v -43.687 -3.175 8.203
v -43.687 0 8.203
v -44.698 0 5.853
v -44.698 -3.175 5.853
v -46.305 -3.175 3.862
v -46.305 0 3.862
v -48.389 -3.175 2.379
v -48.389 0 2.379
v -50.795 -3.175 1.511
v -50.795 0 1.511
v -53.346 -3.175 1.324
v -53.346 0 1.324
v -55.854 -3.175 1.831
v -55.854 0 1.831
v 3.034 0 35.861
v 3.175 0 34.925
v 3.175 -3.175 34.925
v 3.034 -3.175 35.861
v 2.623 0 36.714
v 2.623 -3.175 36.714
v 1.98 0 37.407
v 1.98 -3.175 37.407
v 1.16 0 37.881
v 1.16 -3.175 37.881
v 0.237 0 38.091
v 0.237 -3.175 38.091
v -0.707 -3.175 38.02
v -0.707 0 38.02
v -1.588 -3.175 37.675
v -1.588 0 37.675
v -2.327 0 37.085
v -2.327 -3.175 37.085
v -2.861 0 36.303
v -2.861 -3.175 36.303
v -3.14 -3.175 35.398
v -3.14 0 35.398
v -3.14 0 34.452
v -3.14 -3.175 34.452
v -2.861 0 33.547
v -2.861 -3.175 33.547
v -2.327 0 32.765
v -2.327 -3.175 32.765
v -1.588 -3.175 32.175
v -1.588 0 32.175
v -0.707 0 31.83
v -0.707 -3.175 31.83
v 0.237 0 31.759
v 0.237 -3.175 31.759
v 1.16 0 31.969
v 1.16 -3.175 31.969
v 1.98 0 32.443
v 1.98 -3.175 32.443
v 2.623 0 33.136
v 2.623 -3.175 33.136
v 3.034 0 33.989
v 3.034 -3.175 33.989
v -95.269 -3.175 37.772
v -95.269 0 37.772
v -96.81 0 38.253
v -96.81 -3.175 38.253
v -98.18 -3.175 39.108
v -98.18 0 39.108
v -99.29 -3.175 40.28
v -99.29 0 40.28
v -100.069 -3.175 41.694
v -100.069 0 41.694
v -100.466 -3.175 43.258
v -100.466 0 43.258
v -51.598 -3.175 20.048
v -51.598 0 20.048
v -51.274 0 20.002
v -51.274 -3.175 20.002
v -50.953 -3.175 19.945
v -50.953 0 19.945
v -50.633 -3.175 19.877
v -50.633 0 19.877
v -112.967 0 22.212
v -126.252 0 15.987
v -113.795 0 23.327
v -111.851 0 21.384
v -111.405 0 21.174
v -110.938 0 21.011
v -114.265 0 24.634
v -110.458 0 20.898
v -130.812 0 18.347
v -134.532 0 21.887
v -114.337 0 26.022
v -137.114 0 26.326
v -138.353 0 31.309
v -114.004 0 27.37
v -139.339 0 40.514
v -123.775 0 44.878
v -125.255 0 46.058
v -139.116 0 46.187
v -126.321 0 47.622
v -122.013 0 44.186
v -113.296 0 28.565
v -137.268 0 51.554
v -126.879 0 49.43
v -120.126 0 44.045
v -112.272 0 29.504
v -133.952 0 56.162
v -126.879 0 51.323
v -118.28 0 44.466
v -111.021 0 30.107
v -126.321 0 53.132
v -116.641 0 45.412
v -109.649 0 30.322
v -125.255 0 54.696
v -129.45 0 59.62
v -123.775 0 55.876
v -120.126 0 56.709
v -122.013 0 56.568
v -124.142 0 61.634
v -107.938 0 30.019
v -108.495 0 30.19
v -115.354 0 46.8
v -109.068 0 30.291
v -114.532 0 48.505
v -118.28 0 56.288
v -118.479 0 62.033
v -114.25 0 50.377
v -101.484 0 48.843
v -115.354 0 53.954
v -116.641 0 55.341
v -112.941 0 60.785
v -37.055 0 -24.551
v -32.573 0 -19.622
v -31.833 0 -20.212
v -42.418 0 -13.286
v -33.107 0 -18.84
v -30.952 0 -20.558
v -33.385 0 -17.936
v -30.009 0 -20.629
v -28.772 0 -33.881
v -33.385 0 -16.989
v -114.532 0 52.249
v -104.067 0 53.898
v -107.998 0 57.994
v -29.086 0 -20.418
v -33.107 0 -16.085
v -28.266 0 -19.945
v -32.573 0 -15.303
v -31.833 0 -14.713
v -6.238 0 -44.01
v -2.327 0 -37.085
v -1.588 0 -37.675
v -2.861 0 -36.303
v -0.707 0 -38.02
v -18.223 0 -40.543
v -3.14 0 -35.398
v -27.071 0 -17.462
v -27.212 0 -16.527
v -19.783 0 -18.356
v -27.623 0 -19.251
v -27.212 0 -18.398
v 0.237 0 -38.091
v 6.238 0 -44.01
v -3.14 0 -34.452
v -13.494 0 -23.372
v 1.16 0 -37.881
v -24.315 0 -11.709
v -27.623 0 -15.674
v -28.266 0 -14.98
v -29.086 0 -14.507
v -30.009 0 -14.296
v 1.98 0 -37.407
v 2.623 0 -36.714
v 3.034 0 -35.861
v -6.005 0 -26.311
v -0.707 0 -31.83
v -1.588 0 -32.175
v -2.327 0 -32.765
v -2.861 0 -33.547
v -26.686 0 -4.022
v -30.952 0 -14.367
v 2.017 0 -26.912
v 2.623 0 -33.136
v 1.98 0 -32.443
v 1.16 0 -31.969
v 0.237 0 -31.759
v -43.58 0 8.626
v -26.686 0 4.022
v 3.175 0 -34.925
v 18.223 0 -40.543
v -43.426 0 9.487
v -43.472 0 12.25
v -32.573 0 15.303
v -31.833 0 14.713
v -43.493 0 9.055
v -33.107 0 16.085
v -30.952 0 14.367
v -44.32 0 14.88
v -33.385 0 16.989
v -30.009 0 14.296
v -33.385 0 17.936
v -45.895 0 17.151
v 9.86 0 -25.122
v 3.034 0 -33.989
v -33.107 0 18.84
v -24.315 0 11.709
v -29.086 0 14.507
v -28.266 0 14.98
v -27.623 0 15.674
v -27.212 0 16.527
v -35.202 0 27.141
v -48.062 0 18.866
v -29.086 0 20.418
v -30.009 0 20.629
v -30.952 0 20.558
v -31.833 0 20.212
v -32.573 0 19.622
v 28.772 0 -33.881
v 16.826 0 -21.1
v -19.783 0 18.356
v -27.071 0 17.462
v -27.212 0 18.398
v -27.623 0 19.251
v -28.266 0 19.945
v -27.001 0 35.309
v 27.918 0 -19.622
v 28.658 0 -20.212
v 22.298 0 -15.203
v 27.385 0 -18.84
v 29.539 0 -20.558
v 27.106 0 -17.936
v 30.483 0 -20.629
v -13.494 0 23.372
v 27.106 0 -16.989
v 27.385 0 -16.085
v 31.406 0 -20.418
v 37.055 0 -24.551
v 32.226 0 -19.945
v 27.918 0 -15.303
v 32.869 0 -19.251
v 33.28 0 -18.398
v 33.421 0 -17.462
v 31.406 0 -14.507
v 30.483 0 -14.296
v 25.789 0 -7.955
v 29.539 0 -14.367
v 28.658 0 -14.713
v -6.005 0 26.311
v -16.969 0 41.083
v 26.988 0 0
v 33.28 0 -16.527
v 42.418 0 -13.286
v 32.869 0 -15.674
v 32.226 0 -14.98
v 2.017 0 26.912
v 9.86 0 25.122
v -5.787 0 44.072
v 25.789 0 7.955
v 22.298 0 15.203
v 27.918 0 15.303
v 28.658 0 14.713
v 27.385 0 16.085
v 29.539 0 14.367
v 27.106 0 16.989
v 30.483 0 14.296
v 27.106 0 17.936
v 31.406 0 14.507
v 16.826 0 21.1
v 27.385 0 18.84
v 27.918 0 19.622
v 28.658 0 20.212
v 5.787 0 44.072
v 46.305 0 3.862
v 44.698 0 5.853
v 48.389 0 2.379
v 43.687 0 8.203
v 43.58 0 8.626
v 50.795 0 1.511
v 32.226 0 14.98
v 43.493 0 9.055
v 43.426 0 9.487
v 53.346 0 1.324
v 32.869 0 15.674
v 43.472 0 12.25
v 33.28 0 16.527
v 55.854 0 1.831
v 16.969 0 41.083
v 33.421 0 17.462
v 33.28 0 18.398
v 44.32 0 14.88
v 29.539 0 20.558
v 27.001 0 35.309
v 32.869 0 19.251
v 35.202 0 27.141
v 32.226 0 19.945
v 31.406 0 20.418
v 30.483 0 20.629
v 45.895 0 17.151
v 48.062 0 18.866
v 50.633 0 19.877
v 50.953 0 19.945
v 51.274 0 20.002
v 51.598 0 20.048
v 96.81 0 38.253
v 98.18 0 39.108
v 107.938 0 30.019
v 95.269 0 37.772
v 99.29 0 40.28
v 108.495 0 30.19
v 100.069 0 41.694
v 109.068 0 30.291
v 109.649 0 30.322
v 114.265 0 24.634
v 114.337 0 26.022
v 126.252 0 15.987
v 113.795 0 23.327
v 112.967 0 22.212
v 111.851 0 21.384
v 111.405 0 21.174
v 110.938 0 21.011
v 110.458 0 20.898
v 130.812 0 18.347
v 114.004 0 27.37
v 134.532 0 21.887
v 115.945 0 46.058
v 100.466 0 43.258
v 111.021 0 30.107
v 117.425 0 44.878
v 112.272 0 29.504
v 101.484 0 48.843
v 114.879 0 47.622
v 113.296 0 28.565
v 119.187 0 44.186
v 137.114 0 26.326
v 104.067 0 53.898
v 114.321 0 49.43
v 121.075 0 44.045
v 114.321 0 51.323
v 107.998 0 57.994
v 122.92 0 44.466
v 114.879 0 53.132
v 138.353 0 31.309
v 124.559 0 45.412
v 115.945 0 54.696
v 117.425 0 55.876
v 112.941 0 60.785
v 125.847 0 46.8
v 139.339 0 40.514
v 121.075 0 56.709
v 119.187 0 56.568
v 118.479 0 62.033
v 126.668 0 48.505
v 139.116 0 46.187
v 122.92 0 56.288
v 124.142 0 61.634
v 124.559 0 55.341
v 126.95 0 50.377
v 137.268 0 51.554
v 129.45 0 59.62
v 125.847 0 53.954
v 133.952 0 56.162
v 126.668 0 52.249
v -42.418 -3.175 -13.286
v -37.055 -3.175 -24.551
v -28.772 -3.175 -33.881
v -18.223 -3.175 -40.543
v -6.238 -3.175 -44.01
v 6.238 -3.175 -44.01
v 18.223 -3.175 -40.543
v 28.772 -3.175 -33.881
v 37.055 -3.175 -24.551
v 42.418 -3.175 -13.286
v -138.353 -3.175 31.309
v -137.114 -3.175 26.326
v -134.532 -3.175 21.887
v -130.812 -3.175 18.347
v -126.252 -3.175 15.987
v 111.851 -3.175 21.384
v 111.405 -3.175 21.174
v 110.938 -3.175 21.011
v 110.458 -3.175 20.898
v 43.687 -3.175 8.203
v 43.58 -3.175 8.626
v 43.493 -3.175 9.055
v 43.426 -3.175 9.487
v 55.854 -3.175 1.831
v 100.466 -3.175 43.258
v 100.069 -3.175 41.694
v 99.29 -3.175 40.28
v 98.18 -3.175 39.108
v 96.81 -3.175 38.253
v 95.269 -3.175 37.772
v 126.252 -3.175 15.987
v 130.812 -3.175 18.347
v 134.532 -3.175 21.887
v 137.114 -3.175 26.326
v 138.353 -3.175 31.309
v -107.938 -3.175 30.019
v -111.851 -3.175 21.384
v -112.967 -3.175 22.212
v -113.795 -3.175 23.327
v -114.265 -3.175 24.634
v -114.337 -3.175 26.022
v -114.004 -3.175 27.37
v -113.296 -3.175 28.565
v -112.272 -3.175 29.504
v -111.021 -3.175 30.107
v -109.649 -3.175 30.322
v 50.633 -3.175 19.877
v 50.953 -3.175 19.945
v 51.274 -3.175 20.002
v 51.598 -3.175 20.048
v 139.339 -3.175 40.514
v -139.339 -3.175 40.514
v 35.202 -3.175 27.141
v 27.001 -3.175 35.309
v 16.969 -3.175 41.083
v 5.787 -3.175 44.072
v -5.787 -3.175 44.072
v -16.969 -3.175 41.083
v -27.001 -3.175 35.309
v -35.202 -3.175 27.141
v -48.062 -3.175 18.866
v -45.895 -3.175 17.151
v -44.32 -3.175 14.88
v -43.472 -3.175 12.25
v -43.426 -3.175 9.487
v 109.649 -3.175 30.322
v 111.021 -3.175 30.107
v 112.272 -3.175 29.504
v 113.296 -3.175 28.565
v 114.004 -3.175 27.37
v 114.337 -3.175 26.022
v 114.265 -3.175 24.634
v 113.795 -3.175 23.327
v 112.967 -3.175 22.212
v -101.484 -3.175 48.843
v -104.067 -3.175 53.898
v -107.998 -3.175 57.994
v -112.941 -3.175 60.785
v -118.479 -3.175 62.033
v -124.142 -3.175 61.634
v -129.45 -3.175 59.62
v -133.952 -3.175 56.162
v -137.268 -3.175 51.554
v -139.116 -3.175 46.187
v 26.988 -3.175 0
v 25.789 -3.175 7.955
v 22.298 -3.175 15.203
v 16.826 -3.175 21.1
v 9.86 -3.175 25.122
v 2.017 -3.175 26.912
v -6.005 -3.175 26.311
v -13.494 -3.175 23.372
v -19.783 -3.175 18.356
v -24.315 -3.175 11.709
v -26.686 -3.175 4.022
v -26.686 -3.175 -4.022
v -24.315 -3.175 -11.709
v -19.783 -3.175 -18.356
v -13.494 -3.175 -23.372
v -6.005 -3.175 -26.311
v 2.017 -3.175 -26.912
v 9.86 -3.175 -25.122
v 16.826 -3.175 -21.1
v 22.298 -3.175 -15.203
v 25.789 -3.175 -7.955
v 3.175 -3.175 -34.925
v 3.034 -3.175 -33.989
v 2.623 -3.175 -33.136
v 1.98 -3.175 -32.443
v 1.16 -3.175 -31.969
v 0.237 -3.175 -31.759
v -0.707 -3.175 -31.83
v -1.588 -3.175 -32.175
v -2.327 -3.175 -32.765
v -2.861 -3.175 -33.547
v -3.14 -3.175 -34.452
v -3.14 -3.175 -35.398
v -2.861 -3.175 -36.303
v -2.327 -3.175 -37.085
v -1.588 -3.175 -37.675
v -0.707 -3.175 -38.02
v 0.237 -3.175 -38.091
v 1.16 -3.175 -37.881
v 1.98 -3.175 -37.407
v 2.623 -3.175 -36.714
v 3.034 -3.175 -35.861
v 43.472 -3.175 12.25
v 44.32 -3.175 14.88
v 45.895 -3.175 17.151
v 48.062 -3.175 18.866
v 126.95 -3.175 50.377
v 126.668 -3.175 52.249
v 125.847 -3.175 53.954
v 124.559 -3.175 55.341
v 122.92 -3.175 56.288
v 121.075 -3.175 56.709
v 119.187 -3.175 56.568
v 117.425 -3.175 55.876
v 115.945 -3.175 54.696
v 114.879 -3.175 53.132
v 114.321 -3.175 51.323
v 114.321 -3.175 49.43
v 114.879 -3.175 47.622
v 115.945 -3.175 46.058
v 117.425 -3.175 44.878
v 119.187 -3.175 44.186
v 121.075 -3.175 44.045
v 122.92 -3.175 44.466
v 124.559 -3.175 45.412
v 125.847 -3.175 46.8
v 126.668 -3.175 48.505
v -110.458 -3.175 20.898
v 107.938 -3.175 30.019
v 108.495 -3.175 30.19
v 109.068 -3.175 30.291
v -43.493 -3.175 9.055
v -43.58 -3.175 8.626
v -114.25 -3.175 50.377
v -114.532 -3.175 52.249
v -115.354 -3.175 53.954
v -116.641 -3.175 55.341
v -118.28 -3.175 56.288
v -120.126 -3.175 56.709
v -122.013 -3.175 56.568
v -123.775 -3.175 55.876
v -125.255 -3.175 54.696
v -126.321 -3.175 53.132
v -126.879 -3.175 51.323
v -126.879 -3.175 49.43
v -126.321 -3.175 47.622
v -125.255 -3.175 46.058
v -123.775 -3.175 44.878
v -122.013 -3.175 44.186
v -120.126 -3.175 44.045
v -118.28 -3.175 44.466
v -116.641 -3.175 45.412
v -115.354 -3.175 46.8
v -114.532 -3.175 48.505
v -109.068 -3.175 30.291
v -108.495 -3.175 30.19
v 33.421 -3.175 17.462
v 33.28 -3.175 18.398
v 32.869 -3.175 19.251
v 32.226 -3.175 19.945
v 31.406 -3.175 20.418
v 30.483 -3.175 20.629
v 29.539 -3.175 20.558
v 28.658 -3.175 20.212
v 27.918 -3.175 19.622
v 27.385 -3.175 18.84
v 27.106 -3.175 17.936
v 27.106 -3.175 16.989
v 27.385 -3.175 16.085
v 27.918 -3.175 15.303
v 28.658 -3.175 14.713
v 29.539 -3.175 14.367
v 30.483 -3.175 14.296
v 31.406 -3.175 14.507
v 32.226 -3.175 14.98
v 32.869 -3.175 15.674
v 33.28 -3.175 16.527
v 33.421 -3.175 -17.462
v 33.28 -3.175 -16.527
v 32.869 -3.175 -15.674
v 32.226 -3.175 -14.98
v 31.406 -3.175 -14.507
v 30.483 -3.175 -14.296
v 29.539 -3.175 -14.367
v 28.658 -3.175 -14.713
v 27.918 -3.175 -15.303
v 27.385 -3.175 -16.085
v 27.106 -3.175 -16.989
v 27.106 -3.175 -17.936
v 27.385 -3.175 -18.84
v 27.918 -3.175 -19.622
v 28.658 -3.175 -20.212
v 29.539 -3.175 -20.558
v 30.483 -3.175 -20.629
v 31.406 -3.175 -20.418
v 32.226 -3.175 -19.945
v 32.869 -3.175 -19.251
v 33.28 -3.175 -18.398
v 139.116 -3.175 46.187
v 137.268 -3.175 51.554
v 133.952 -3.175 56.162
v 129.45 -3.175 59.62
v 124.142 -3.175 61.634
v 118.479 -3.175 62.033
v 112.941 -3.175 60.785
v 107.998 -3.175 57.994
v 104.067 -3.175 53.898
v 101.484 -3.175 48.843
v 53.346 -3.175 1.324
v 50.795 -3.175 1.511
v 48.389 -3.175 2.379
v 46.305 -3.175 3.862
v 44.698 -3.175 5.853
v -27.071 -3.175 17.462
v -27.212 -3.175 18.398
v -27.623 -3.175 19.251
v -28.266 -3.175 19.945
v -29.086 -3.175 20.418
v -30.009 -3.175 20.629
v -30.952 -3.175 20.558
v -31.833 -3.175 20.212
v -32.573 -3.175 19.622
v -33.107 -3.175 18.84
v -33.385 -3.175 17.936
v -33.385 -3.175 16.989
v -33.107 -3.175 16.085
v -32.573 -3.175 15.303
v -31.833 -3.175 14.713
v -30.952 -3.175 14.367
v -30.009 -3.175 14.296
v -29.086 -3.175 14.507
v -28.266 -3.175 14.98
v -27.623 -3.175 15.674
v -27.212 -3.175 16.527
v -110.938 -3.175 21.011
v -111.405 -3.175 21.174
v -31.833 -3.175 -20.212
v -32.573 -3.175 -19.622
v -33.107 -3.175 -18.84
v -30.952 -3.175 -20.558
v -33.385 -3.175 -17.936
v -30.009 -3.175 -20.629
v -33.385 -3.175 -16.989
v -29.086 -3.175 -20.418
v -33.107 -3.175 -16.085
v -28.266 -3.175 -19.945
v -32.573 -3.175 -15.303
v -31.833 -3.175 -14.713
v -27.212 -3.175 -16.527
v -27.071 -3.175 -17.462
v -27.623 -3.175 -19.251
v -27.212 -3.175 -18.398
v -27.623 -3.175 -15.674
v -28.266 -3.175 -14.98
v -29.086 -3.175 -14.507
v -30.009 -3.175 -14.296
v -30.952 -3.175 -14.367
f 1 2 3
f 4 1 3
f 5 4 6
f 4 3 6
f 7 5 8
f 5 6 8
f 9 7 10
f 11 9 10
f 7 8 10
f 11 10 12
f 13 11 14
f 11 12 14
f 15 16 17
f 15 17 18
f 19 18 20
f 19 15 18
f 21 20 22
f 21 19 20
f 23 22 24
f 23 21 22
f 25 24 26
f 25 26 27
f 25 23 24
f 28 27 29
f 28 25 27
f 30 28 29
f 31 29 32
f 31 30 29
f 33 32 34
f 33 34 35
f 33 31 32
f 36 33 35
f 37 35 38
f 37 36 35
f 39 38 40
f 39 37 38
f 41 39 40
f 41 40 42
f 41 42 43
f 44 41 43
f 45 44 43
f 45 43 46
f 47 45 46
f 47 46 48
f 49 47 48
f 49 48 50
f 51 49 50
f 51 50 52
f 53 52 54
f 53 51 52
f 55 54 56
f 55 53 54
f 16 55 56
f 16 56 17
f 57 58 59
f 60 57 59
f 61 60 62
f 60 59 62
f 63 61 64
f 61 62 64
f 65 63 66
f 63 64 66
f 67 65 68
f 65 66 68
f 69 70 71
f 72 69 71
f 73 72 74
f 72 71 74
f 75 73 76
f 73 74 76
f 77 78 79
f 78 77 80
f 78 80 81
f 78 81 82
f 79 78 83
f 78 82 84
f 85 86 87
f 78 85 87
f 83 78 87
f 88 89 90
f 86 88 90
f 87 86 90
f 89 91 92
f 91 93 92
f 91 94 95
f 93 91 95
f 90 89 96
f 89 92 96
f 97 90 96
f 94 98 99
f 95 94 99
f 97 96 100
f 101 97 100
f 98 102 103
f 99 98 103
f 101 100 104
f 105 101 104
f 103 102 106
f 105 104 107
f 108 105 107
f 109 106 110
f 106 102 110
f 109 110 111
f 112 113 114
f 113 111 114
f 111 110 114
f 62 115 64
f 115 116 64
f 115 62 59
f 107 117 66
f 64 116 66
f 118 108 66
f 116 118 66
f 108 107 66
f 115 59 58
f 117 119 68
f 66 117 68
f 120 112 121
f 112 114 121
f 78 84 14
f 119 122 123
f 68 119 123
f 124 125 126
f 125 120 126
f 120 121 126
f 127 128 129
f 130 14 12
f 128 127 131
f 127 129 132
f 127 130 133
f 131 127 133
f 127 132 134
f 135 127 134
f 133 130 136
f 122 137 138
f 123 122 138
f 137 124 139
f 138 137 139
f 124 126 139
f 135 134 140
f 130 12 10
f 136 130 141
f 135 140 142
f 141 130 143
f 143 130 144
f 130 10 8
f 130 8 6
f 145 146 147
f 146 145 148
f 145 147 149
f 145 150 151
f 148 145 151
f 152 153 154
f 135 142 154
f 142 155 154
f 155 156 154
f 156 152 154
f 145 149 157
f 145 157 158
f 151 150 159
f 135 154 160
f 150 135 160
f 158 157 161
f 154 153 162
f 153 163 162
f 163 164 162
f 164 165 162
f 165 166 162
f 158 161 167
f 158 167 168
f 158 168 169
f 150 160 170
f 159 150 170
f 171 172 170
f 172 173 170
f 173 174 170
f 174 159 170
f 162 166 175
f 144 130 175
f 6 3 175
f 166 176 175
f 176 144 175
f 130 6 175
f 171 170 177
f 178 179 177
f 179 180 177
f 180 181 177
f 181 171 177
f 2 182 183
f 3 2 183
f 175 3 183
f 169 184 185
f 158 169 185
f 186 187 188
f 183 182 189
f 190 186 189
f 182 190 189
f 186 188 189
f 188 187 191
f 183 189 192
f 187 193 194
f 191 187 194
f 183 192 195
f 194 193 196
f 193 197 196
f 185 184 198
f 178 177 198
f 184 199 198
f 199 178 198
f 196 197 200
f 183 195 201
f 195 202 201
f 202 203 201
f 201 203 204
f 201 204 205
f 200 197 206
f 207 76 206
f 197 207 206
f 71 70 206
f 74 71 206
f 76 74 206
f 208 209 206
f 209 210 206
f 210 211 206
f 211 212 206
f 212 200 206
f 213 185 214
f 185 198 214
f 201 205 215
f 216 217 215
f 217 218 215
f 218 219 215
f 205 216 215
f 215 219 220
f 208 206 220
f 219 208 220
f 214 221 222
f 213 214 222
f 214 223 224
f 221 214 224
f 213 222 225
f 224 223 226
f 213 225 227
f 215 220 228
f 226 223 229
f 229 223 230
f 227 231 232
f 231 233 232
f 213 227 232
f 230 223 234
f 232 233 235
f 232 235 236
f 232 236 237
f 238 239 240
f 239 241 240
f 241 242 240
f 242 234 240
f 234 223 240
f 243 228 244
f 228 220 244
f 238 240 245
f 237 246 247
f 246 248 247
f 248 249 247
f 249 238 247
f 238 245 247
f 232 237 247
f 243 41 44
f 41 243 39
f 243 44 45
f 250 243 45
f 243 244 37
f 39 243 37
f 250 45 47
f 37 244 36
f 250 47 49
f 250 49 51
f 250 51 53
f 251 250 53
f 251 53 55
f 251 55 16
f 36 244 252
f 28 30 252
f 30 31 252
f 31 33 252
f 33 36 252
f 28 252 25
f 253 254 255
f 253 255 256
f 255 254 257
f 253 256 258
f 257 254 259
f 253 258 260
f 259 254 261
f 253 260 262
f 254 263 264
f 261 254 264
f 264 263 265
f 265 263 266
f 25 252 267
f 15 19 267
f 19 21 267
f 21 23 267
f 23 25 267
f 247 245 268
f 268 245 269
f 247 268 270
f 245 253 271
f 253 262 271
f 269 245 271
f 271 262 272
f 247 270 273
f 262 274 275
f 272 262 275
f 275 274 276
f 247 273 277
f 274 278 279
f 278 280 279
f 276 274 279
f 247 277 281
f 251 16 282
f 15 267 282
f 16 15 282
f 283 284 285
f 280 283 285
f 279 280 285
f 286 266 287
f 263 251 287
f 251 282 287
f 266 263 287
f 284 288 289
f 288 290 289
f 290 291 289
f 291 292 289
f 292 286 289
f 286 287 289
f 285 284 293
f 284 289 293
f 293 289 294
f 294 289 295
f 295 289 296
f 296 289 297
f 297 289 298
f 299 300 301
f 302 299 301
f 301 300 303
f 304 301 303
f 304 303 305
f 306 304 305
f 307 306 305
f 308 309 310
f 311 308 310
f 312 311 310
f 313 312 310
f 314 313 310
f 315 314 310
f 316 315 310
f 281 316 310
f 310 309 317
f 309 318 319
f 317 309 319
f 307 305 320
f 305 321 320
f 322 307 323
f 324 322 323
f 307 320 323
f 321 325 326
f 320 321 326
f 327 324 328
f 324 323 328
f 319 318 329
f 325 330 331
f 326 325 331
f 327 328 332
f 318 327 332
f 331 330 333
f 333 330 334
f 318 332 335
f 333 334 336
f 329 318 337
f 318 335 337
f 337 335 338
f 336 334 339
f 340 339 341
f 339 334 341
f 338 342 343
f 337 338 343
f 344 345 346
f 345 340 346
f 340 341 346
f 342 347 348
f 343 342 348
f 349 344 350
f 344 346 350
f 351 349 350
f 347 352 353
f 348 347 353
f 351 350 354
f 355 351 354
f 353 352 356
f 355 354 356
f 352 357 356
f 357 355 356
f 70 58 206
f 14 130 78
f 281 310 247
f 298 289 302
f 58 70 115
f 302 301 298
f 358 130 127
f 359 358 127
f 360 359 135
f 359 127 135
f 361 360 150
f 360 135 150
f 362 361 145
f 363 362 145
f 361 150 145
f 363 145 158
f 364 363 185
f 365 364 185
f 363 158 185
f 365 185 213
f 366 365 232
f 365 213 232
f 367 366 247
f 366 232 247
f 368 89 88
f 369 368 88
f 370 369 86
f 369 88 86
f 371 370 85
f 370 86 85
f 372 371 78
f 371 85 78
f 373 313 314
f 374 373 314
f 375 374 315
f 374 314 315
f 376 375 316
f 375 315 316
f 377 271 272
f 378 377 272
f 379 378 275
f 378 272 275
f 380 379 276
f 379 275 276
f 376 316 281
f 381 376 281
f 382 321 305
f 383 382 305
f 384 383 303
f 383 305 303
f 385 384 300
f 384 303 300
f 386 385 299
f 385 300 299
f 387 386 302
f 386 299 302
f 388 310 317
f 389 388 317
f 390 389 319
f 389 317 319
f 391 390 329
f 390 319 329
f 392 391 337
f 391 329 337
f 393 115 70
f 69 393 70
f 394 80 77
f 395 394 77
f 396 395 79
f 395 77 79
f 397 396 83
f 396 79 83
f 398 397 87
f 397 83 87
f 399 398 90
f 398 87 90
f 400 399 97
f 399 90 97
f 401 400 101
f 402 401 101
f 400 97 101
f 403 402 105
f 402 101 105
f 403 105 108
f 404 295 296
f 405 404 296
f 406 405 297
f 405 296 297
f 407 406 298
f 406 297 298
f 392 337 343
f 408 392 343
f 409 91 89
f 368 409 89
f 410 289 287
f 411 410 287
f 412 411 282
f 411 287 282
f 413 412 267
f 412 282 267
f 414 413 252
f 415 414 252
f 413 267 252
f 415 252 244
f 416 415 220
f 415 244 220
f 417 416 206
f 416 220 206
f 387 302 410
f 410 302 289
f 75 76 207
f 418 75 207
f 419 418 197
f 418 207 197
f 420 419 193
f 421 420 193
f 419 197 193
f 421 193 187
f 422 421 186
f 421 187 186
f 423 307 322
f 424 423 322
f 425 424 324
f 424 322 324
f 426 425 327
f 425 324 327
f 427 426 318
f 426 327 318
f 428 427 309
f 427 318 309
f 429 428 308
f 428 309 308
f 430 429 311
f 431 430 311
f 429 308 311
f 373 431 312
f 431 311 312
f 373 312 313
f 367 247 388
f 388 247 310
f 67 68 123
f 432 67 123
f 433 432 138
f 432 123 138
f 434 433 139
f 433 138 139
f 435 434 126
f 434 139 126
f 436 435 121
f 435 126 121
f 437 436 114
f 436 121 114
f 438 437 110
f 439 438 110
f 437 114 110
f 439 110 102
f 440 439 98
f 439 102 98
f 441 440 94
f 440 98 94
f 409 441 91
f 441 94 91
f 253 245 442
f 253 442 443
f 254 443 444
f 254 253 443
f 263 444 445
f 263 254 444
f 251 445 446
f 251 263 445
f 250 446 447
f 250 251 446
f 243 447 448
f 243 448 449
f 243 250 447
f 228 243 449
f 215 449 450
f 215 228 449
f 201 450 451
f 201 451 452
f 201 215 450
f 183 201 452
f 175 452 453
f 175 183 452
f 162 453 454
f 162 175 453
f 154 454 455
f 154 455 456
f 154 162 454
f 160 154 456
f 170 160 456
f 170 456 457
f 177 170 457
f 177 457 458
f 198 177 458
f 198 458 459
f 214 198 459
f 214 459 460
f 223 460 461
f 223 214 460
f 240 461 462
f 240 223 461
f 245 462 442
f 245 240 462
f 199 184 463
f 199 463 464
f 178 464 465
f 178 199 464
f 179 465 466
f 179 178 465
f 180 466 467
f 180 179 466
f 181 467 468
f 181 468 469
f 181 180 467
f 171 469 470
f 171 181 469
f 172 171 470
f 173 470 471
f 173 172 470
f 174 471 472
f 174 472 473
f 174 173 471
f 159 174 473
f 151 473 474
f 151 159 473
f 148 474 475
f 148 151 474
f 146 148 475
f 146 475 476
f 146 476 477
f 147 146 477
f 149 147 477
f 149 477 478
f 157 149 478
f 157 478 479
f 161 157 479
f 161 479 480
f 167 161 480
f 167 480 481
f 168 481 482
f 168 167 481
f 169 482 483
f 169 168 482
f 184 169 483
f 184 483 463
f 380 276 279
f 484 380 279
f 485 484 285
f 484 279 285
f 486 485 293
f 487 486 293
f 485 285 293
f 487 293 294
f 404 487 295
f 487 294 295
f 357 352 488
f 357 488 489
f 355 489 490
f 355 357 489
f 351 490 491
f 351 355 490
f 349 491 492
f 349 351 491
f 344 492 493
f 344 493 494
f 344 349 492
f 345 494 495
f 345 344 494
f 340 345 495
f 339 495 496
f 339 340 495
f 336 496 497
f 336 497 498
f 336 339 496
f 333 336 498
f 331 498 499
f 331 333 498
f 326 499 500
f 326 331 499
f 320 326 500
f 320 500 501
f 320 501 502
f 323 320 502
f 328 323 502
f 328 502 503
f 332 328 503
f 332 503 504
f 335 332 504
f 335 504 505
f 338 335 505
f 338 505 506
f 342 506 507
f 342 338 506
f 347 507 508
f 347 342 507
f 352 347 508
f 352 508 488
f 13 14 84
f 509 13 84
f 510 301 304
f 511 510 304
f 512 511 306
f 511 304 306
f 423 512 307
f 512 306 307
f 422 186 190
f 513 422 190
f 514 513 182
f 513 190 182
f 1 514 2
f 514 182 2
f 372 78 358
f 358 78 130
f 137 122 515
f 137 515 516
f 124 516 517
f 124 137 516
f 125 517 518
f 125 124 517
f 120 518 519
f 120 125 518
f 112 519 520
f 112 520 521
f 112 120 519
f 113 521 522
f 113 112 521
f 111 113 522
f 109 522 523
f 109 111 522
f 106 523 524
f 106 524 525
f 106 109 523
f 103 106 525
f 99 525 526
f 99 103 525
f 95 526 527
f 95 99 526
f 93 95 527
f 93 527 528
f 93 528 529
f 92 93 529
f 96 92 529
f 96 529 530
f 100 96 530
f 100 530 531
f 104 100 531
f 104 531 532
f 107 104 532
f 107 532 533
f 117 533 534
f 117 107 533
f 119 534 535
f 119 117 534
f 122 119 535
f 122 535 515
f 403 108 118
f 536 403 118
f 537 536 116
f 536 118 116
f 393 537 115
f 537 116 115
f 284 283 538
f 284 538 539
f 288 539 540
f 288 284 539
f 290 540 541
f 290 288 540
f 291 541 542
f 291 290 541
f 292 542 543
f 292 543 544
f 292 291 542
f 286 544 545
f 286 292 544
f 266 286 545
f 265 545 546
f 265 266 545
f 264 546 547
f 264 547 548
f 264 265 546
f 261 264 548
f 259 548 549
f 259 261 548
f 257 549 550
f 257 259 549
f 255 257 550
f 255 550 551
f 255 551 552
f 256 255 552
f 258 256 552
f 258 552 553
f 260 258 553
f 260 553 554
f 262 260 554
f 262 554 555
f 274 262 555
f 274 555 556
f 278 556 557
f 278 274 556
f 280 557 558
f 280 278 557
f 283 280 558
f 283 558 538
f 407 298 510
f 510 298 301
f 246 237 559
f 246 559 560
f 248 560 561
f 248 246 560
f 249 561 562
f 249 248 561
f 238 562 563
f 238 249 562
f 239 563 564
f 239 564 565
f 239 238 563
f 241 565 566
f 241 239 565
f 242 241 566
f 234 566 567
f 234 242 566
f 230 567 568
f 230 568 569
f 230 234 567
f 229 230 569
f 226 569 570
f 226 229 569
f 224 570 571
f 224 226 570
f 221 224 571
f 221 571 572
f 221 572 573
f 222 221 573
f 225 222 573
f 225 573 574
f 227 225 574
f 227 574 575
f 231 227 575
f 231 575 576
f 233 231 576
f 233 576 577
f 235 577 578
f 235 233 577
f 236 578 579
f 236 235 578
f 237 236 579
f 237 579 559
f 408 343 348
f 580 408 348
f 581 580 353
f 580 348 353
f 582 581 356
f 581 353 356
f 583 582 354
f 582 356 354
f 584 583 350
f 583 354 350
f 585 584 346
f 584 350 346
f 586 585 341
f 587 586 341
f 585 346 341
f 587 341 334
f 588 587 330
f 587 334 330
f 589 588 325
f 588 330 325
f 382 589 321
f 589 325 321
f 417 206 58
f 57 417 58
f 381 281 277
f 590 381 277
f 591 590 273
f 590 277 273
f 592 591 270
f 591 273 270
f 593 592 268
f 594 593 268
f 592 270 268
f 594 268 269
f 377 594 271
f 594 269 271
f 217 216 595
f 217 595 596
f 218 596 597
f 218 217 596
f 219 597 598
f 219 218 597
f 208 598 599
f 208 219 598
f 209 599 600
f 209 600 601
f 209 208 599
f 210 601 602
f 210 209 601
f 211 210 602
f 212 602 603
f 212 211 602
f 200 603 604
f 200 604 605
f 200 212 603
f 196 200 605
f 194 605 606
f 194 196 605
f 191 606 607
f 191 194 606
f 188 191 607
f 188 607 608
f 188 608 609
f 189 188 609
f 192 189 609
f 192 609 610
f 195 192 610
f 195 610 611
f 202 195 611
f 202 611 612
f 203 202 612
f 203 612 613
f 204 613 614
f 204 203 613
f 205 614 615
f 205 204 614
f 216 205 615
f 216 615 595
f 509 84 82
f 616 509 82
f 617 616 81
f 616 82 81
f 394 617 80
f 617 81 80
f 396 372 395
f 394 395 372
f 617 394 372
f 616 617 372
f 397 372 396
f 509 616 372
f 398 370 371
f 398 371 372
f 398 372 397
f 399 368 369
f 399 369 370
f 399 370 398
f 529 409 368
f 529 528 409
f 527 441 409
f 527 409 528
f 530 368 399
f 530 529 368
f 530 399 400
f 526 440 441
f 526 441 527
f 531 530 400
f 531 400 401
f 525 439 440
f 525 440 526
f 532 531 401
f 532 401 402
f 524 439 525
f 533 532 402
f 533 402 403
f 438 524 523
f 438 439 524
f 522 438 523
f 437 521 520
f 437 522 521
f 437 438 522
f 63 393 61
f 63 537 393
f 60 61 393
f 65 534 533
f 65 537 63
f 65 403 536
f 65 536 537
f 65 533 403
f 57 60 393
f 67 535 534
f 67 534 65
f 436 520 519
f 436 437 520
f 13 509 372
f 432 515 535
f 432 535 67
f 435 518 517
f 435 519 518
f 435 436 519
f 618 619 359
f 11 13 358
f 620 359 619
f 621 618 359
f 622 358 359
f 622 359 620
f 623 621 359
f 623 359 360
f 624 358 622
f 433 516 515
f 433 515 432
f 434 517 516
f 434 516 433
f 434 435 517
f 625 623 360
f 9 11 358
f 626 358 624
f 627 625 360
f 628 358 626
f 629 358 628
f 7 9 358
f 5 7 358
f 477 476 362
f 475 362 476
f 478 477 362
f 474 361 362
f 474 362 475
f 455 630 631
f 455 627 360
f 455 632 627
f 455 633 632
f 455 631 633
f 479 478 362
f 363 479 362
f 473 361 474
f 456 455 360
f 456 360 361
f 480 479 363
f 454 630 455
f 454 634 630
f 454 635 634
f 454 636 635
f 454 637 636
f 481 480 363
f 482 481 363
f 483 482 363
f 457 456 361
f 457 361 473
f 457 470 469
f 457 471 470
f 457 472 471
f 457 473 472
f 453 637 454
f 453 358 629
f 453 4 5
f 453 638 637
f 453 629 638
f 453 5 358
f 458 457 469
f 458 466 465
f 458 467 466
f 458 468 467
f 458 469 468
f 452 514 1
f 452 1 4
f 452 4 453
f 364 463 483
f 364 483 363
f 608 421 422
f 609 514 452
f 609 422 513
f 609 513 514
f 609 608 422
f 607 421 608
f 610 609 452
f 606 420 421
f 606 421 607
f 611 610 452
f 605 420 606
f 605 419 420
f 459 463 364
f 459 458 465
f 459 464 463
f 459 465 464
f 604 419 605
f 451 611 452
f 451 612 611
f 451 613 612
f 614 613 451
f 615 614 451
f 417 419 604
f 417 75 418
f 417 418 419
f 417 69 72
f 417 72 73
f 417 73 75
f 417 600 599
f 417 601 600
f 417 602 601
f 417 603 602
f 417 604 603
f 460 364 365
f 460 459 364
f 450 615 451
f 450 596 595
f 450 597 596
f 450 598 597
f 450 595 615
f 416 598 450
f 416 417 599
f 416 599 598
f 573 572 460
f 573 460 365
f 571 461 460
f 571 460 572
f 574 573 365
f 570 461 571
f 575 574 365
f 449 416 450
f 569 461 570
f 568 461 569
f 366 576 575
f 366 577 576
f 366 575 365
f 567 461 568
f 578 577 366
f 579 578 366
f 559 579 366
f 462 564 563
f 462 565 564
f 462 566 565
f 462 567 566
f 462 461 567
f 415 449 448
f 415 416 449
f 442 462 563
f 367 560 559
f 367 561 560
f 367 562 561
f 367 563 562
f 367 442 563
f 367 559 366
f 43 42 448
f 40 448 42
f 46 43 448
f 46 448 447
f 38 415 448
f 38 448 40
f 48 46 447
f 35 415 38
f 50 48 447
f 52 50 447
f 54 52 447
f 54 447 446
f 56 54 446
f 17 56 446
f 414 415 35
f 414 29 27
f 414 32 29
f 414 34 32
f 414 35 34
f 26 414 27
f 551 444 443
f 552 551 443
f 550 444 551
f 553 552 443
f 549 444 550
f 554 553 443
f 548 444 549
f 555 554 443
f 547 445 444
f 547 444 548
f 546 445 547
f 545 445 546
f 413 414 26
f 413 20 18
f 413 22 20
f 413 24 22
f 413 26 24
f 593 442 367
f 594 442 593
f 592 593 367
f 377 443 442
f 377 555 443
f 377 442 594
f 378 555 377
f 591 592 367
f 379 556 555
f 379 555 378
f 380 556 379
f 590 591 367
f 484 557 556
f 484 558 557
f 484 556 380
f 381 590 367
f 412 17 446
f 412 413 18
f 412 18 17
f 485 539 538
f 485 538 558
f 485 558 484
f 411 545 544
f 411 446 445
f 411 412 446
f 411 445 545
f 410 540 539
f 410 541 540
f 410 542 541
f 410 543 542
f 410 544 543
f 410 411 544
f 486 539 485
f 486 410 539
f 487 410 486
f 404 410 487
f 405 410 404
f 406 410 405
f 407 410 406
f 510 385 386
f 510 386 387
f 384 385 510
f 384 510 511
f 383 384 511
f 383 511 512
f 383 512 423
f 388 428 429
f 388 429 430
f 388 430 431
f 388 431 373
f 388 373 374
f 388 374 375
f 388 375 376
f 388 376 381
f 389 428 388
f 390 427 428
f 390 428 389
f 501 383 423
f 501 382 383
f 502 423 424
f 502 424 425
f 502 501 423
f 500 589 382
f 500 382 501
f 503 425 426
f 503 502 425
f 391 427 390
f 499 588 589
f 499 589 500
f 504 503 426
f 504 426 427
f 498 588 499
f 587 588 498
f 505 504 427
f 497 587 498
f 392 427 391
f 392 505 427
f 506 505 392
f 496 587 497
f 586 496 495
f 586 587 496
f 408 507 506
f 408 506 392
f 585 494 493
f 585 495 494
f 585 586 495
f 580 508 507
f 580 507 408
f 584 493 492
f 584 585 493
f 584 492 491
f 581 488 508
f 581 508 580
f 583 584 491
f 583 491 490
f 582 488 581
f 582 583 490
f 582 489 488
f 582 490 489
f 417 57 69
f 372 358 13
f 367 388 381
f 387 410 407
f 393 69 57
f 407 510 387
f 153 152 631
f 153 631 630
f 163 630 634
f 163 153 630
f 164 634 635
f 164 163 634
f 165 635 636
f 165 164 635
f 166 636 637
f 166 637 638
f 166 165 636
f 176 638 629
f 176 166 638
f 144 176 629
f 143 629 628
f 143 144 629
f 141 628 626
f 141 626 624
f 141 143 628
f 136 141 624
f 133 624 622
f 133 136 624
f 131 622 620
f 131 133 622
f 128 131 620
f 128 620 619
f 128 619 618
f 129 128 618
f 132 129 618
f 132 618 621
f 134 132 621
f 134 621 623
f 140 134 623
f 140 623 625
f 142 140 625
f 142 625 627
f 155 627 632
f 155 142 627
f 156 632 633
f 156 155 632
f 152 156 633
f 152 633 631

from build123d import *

# Parameters (mm, degrees)
F0_R     = 6.35
F0_R_2   = 3.175
F0_R_3   = 26.9875
F1_DEPTH = 3.175


# Not quite as in the source:
# - a feature names something its author has since deleted; it is built from what else it names


with BuildPart() as f1:
    # F0 (on Front) → F1 (new body)
    with BuildSketch(Plane.XZ):
        with BuildLine():
            ThreePointArc((-43.4258934254, 9.4865315159), (-40.2925849359, 18.769925391), (-35.2015661866, 27.1413381765))
            Line((-35.2015661866, 27.1413381765), (-95.2689163392, 37.7723748329))
            ThreePointArc((-95.2689163392, 37.7723748329), (-98.7721627257, 39.6581308221), (-100.4657668126, 43.2582025009))
            ThreePointArc((-100.4657668126, 43.2582025009), (-121.3252913638, 62.0407471137), (-139.3392654958, 40.5140083313))
            Line((-139.3392654958, 40.5140083313), (-138.3529874387, 31.3088718833))
            ThreePointArc((-138.3529874387, 31.3088718833), (-134.5315509232, 21.8873221018), (-126.2516022963, 15.9872010809))
            Line((-126.2516022963, 15.9872010809), (-42.4180155898, -13.285874206))
            ThreePointArc((-42.4180155899, -13.285874206), (-44.3727417421, -2.6195973531), (-43.6866122567, 8.2025855396))
            ThreePointArc((-43.6866122567, 8.2025855396), (-48.388636459, 2.3785824935), (-55.8537619567, 1.8309107075))
            Line((-55.8537619567, 1.8309107075), (-110.4577448757, 20.8975708106))
            ThreePointArc((-110.4577448757, 20.8975708106), (-111.1735466188, 21.086419267), (-111.8513183434, 21.3841798493))
            ThreePointArc((-111.8513183434, 21.3841798493), (-114.2200668687, 26.7082159188), (-109.6486913125, 30.321919721))
            ThreePointArc((-109.6486913125, 30.321919721), (-108.7795274506, 30.2493985469), (-107.9382701007, 30.0192003476))
            Line((-107.9382701007, 30.0192003476), (-51.5976439548, 20.0477389749))
            ThreePointArc((-51.5976439548, 20.0477389749), (-51.1132512592, 19.9749597914), (-50.6333036668, 19.8770649411))
            ThreePointArc((-50.6333036668, 19.8770649411), (-45.0232212062, 16.073525101), (-43.4258934254, 9.4865315159))
        make_face()
        with Locations((-120.6001266837, 50.3768287599)):
            Circle(F0_R, mode=Mode.SUBTRACT)
        with BuildLine():
            ThreePointArc((35.2015661866, 27.1413381765), (0, 44.45), (-35.2015661866, 27.1413381765))
            ThreePointArc((-35.2015661866, 27.1413381765), (-40.2925849359, 18.769925391), (-43.4258934254, 9.4865315159))
            ThreePointArc((-43.4258934254, 9.4865315159), (-43.533872992, 8.8400140623), (-43.6866122567, 8.2025855396))
            ThreePointArc((-43.6866122567, 8.2025855396), (-44.3727417421, -2.6195973531), (-42.4180155899, -13.285874206))
            ThreePointArc((-42.4180155899, -13.285874206), (0, -44.45), (42.4180155899, -13.285874206))
            ThreePointArc((42.4180155899, -13.285874206), (43.9390674285, -6.7201825508), (44.45, 0))
            ThreePointArc((44.45, 0), (44.2587415931, 4.1190159741), (43.6866122567, 8.2025855396))
            ThreePointArc((43.6866122567, 8.2025855396), (43.533872992, 8.8400140623), (43.4258934254, 9.4865315159))
            ThreePointArc((43.4258934254, 9.4865315159), (40.2925849359, 18.769925391), (35.2015661866, 27.1413381765))
        make_face()
        with Locations((0, -34.925)):
            Circle(F0_R_2, mode=Mode.SUBTRACT)
        with Locations((-30.2459372272, -17.4625)):
            Circle(F0_R_2, mode=Mode.SUBTRACT)
        Circle(F0_R_3, mode=Mode.SUBTRACT)
        with Locations((30.2459372272, -17.4625)):
            Circle(F0_R_2, mode=Mode.SUBTRACT)
        with Locations((-30.2459372272, 17.4625)):
            Circle(F0_R_2, mode=Mode.SUBTRACT)
        with Locations((0, 34.925)):
            Circle(F0_R_2, mode=Mode.SUBTRACT)
        with Locations((30.2459372272, 17.4625)):
            Circle(F0_R_2, mode=Mode.SUBTRACT)
        with BuildLine():
            Line((95.2689163392, 37.7723748329), (35.2015661866, 27.1413381765))
            ThreePointArc((35.2015661866, 27.1413381765), (40.2925849359, 18.769925391), (43.4258934254, 9.4865315159))
            ThreePointArc((43.4258934254, 9.4865315159), (45.0232212062, 16.073525101), (50.6333036668, 19.8770649411))
            ThreePointArc((50.6333036668, 19.8770649411), (51.1132512592, 19.9749597914), (51.5976439548, 20.0477389749))
            Line((51.5976439548, 20.0477389749), (107.9382701008, 30.0192003476))
            ThreePointArc((107.9382701008, 30.0192003476), (108.7795274506, 30.2493985469), (109.6486913125, 30.321919721))
            ThreePointArc((109.6486913125, 30.321919721), (114.2200668687, 26.7082159188), (111.8513183434, 21.3841798493))
            ThreePointArc((111.8513183434, 21.3841798493), (111.1735466188, 21.086419267), (110.4577448757, 20.8975708106))
            Line((110.4577448757, 20.8975708106), (55.8537619567, 1.8309107075))
            ThreePointArc((55.8537619567, 1.8309107075), (48.388636459, 2.3785824935), (43.6866122567, 8.2025855396))
            ThreePointArc((43.6866122567, 8.2025855396), (44.2587415931, 4.1190159741), (44.45, 0))
            ThreePointArc((44.45, 0), (43.9390674285, -6.7201825508), (42.4180155899, -13.285874206))
            Line((42.4180155898, -13.285874206), (126.2516022963, 15.9872010809))
            ThreePointArc((126.2516022963, 15.9872010809), (134.5315509232, 21.8873221018), (138.3529874387, 31.3088718833))
            Line((138.3529874387, 31.3088718833), (139.3392654958, 40.5140083313))
            ThreePointArc((139.3392654958, 40.5140083313), (121.3252913638, 62.0407471137), (100.4657668126, 43.2582025009))
            ThreePointArc((100.4657668126, 43.2582025009), (98.7721627257, 39.6581308221), (95.2689163392, 37.7723748329))
        make_face()
        with Locations((120.6001266837, 50.3768287599)):
            Circle(F0_R, mode=Mode.SUBTRACT)
    extrude(amount=F1_DEPTH)


solid = f1.part
